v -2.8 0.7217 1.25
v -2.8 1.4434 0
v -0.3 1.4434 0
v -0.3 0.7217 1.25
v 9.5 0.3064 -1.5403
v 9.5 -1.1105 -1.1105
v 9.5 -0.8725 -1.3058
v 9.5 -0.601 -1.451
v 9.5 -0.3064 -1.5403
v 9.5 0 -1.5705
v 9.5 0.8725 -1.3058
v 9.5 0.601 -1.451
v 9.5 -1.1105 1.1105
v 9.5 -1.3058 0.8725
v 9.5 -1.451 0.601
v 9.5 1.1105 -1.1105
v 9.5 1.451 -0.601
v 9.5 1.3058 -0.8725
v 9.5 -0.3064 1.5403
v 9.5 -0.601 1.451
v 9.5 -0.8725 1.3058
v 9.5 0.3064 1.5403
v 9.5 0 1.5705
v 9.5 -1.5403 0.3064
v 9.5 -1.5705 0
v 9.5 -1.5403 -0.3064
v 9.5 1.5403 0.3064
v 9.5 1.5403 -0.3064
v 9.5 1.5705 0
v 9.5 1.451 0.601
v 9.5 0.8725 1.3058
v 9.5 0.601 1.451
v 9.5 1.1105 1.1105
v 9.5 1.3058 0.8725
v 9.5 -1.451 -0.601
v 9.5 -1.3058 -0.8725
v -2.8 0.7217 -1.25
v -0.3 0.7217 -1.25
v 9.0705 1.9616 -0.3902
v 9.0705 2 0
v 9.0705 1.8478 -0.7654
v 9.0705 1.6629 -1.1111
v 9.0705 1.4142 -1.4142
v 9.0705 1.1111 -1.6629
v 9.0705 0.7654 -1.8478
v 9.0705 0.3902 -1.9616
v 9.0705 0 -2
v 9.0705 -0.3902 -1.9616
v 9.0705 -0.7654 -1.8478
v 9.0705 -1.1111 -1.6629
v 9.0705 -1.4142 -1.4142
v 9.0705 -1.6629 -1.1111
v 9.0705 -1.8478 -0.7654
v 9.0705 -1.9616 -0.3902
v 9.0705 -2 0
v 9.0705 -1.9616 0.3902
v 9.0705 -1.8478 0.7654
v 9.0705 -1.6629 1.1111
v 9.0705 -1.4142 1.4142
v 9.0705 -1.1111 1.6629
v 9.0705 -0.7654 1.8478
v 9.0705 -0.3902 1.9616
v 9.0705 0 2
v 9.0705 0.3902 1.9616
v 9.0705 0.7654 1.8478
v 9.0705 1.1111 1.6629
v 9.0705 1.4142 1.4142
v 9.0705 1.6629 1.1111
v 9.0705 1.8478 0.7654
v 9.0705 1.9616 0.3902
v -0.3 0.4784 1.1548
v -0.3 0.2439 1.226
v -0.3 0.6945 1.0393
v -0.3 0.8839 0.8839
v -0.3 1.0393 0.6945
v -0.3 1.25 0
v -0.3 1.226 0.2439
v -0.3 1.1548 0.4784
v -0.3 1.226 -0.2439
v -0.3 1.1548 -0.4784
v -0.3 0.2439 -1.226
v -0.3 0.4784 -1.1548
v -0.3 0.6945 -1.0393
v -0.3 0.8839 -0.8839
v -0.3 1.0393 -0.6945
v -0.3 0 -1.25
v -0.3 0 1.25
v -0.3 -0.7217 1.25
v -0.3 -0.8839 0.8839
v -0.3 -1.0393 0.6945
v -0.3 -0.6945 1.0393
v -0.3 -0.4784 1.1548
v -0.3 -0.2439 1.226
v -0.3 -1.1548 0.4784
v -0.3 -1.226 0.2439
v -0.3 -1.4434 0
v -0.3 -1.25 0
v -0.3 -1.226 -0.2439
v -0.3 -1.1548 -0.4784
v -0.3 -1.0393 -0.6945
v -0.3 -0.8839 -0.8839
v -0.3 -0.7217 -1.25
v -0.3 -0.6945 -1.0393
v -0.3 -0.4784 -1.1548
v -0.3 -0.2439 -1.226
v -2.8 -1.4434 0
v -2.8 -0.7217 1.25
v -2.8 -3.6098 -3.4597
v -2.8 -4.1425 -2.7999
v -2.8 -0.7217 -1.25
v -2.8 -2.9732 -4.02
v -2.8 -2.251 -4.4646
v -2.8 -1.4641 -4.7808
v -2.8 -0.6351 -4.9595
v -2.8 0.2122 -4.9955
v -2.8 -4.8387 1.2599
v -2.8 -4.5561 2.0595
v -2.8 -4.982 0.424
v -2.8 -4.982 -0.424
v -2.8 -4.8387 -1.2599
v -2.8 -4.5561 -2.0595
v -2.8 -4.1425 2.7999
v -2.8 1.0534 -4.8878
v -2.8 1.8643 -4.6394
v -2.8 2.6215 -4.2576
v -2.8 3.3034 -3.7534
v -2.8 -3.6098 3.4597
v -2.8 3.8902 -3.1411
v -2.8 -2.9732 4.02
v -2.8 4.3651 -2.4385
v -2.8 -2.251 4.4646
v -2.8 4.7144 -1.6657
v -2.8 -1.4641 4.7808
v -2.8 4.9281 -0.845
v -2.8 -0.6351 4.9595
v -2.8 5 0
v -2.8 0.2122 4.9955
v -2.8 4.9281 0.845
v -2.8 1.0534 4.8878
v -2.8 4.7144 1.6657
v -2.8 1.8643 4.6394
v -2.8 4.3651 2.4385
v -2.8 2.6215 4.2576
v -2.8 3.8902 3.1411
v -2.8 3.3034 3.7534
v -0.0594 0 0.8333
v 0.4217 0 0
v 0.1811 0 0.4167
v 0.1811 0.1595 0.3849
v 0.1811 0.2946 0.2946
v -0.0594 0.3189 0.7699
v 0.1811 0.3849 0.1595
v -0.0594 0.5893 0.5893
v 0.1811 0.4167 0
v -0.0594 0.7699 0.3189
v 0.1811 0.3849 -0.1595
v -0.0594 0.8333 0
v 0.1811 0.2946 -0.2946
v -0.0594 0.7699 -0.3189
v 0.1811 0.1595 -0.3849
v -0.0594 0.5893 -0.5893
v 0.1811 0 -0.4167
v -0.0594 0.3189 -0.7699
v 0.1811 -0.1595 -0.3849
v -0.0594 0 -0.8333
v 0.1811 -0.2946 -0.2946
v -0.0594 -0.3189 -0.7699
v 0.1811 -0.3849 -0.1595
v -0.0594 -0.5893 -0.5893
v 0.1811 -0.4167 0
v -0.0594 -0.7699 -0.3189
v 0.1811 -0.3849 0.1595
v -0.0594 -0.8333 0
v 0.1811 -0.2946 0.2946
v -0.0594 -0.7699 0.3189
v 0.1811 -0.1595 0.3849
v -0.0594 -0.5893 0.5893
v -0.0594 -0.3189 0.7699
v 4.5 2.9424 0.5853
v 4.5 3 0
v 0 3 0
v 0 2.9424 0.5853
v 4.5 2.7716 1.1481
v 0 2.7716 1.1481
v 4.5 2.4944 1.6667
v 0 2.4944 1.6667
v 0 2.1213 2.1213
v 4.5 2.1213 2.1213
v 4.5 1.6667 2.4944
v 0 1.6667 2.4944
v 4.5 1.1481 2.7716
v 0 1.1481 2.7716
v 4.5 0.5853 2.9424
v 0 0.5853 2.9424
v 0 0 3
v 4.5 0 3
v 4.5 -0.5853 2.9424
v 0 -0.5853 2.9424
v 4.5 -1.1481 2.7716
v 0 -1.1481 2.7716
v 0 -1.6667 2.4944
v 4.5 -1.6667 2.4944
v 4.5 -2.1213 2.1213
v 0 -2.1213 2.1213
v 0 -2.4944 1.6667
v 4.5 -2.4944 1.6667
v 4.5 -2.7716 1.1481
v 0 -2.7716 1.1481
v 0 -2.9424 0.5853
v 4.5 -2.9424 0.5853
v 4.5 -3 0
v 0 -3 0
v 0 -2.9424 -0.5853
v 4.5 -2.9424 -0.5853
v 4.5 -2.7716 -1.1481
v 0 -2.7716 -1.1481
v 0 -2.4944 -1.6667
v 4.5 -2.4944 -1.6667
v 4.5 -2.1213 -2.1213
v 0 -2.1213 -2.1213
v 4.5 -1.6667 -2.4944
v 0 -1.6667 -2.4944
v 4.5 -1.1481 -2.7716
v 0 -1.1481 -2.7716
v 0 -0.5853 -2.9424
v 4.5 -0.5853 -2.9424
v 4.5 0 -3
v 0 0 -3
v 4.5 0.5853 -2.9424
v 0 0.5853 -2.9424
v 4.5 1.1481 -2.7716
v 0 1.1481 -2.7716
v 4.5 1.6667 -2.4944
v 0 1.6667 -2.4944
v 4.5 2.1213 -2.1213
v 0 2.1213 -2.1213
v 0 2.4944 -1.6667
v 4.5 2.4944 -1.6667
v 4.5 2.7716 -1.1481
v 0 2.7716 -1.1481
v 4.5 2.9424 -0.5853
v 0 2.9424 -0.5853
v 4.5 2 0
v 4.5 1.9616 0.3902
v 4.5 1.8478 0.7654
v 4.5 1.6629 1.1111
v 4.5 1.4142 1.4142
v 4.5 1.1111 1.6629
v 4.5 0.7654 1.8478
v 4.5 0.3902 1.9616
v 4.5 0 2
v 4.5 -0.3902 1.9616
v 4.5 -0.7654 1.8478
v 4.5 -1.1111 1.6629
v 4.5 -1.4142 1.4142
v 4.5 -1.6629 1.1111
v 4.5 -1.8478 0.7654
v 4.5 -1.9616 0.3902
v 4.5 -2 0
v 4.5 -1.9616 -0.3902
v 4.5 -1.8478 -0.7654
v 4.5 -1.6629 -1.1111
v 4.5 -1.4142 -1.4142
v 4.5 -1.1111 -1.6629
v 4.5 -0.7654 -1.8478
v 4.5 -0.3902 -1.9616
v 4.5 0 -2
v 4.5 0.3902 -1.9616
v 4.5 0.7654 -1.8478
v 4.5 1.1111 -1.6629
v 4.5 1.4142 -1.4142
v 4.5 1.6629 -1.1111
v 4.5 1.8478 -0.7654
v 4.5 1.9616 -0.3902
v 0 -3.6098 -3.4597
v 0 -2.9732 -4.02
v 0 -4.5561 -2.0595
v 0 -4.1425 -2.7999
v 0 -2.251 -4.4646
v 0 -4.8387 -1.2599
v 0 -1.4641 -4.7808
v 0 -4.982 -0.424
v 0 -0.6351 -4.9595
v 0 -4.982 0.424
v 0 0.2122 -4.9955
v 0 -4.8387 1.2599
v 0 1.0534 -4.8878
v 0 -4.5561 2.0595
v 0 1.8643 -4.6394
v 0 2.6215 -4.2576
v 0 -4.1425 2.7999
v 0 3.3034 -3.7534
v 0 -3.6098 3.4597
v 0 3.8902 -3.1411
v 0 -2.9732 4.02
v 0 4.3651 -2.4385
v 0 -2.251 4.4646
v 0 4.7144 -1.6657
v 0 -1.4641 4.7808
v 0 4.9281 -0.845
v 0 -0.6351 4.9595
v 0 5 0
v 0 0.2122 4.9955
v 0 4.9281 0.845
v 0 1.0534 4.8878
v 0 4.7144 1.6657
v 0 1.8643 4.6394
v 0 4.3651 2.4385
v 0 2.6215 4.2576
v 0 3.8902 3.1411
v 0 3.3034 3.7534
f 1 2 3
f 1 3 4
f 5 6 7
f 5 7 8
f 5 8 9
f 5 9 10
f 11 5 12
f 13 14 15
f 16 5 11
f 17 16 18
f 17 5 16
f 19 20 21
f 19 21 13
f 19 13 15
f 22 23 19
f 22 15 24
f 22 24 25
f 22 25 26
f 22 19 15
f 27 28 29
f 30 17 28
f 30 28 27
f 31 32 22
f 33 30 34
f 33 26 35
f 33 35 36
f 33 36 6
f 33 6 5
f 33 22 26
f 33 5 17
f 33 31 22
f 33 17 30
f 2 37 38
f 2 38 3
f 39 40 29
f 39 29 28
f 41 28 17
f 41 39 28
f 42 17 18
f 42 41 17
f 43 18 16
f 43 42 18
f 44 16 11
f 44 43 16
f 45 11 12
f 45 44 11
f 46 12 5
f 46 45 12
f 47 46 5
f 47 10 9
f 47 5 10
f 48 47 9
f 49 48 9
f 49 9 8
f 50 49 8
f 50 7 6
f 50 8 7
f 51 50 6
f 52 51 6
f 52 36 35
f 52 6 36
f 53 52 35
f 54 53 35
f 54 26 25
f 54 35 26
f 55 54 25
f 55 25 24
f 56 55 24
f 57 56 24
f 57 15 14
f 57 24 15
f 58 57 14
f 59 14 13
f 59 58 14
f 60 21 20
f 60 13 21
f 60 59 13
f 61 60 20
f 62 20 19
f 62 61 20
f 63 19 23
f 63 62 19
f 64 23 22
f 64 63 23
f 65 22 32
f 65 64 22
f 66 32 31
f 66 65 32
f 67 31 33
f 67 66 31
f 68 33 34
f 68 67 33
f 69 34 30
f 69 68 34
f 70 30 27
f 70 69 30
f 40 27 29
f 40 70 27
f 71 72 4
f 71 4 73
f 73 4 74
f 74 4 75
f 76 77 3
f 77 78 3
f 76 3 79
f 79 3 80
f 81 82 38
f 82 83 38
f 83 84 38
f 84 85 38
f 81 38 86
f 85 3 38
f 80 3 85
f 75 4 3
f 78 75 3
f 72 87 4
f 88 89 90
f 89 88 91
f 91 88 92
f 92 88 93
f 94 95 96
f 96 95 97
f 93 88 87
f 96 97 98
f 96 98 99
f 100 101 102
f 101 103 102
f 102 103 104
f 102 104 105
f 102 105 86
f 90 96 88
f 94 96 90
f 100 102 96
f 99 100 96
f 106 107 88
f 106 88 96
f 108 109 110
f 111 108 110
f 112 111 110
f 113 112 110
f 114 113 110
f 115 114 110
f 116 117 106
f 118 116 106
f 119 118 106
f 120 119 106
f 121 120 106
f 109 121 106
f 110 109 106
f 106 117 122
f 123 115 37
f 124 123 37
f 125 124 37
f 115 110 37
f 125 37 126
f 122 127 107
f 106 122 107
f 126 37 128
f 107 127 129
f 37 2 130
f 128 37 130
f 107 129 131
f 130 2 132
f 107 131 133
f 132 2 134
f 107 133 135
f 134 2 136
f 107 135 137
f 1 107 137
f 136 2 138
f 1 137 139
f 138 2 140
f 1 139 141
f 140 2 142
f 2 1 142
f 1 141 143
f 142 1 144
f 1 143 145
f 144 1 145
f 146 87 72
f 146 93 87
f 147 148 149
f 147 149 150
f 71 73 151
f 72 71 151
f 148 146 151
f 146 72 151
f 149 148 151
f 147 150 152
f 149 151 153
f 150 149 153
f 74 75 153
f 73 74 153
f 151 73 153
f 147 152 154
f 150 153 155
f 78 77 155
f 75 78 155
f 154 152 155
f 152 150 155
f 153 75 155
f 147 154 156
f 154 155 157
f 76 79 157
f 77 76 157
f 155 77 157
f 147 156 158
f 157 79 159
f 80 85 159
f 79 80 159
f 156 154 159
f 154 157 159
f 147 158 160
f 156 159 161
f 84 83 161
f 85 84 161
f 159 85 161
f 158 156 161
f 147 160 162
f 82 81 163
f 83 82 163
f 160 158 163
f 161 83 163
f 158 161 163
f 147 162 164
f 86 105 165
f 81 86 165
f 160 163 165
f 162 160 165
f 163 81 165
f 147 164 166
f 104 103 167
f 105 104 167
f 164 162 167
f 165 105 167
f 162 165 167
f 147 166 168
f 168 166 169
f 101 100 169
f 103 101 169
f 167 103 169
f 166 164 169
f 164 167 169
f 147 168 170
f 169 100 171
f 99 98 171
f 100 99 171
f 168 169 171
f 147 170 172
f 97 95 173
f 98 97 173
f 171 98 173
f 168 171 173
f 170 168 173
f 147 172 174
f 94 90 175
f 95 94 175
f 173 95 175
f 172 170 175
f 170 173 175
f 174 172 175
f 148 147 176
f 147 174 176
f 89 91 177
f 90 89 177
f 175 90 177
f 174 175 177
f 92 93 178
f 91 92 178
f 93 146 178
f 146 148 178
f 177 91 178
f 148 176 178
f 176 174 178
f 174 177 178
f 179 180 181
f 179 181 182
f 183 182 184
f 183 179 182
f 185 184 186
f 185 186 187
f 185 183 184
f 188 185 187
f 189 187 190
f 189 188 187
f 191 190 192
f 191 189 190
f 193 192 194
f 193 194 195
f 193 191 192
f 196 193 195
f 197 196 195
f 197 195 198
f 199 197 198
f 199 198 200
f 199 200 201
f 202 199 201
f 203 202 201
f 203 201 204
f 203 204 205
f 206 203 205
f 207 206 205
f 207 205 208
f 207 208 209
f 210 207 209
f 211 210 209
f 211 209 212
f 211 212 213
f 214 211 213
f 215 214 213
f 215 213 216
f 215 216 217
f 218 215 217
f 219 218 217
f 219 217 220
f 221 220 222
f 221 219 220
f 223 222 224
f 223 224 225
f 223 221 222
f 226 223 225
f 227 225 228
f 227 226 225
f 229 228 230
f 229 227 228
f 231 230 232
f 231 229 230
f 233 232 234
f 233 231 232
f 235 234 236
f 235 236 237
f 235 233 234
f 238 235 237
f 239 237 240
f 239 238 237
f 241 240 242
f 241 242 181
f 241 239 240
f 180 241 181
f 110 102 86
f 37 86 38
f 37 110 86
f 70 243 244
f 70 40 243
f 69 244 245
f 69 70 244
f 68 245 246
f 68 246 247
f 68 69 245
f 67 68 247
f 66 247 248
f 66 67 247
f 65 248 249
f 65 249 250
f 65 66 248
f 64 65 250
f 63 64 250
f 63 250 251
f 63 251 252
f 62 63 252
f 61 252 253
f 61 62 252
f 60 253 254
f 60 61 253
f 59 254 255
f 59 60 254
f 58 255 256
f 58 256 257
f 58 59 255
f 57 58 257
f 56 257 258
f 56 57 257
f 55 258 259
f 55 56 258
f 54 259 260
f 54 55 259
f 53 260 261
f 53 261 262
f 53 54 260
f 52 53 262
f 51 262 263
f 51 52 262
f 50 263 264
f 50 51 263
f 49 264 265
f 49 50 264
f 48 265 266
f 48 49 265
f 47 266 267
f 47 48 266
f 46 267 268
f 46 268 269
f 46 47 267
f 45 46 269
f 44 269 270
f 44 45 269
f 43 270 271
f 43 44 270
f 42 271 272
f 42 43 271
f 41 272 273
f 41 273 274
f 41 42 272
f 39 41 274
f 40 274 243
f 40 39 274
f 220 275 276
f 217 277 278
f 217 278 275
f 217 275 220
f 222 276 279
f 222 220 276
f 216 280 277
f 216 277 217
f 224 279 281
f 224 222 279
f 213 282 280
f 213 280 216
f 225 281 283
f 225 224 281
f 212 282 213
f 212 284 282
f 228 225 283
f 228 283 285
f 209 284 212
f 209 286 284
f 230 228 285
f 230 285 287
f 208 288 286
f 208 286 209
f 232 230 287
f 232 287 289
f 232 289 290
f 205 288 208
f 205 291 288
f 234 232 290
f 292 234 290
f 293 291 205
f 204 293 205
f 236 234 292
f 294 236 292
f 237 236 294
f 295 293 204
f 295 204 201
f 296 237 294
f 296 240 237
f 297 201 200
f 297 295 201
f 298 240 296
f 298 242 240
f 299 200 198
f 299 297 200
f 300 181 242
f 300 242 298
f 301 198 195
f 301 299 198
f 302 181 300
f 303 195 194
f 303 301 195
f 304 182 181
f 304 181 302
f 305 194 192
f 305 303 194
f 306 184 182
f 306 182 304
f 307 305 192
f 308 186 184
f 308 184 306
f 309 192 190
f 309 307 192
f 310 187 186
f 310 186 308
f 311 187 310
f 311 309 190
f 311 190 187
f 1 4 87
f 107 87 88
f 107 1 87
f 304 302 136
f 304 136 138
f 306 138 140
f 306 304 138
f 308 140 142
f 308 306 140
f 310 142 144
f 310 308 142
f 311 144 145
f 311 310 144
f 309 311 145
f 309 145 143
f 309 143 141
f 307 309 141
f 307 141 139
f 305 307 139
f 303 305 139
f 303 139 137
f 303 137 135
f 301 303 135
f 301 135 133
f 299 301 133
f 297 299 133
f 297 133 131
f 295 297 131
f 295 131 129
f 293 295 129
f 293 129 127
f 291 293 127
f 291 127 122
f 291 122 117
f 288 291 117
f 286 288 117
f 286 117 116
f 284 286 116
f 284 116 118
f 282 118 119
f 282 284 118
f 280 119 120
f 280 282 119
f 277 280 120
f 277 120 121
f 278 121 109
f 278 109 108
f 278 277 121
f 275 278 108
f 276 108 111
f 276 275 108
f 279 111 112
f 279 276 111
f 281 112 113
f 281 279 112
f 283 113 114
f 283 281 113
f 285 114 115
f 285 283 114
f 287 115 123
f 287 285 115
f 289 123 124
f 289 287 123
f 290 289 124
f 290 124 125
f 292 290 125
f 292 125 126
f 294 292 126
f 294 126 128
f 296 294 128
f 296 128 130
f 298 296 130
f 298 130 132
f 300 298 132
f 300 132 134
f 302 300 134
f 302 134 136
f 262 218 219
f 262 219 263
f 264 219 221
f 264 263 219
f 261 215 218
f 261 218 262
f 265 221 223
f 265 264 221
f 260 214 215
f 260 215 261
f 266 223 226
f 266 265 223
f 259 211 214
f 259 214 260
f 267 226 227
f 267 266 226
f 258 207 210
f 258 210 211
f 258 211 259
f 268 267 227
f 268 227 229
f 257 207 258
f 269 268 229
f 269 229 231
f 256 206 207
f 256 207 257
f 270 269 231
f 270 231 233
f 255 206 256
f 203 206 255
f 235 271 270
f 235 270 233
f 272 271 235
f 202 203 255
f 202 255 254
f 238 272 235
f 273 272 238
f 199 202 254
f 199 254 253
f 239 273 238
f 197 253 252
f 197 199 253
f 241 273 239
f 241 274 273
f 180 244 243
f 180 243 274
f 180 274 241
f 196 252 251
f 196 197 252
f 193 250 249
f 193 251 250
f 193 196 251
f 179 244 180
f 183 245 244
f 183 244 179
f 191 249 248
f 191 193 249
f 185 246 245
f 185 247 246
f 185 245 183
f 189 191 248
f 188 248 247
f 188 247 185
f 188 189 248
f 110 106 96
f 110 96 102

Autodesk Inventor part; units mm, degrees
ref_plane "YZ Plane" through (0, 0, 0) normal (1, 0, 0) x (0, 1, 0)
ref_plane "XZ Plane" through (0, 0, 0) normal (0, 1, 0) x (-1, 0, 0)
ref_plane "XY Plane" through (0, 0, 0) normal (0, 0, 1) x (1, 0, 0)
sketch "Sketch_1" plane through (0, 0, 0) normal (0, 0, 1) x (1, 0, 0)
  line L0 (4.5, 0) -> (-2.8, 0)
  line L1 (-2.8, 0) -> (-2.8, 5)
  line L2 (-2.8, 5) -> (0, 5)
  line L3 (0, 5) -> (0, 3)
  line L4 (0, 3) -> (4.5, 3)
  line L5 (4.5, 3) -> (4.5, 0)
  line L6 (4.5, 0) -> (-2.8, 0)
revolve "Revolution1" add sketch "Sketch_1" angle 360 about axis through (4.5, 0, 0) along (1, 0, 0)
sketch "Sketch2" plane through (-2.8, 0, 0) normal (-1, 0, 0) x (0, 0, 1)
  point P0 (0, 0)
hole "Hole1" at (-2.8, 0, 0) direction (1, 0, 0) diameter 2.5 depth 2.5 tip angle 120
sketch "Sketch_3" plane through (-2.8, 0, 0) normal (1, 0, 0) x (0, 0, -1)
  line L0 (-1.25, -0.7217) -> (0, -1.4434)
  line L1 (0, -1.4434) -> (1.25, -0.7217)
  line L2 (1.25, -0.7217) -> (1.25, 0.7217)
  line L3 (1.25, 0.7217) -> (0, 1.4434)
  line L4 (0, 1.4434) -> (-1.25, 0.7217)
  line L5 (-1.25, 0.7217) -> (-1.25, -0.7217)
extrude "Extrusion1" cut sketch "Sketch_3" along normal blind 2.5
sketch "Sketch_6" plane through (0, 0, 0) normal (0, 0, 1) x (1, 0, 0)
  line L0 (9.5, 0) -> (4.5, 0)
  line L1 (4.5, 0) -> (4.5, 2)
  line L2 (4.5, 2) -> (9.0705, 2)
  line L3 (9.0705, 2) -> (9.5, 1.5705)
  line L4 (9.5, 1.5705) -> (9.5, 0)
  line L5 (9.5, 0) -> (4.5, 0)
revolve "Revolution2" add sketch "Sketch_6" angle 360 about axis through (9.5, 0, 0) along (1, 0, 0)
thread "Thread1" size "M4x0.7" class "6g" standard "ISO Metric profile" length 3.3705
properties part number "DBTS4-4.5-5-LTC"
